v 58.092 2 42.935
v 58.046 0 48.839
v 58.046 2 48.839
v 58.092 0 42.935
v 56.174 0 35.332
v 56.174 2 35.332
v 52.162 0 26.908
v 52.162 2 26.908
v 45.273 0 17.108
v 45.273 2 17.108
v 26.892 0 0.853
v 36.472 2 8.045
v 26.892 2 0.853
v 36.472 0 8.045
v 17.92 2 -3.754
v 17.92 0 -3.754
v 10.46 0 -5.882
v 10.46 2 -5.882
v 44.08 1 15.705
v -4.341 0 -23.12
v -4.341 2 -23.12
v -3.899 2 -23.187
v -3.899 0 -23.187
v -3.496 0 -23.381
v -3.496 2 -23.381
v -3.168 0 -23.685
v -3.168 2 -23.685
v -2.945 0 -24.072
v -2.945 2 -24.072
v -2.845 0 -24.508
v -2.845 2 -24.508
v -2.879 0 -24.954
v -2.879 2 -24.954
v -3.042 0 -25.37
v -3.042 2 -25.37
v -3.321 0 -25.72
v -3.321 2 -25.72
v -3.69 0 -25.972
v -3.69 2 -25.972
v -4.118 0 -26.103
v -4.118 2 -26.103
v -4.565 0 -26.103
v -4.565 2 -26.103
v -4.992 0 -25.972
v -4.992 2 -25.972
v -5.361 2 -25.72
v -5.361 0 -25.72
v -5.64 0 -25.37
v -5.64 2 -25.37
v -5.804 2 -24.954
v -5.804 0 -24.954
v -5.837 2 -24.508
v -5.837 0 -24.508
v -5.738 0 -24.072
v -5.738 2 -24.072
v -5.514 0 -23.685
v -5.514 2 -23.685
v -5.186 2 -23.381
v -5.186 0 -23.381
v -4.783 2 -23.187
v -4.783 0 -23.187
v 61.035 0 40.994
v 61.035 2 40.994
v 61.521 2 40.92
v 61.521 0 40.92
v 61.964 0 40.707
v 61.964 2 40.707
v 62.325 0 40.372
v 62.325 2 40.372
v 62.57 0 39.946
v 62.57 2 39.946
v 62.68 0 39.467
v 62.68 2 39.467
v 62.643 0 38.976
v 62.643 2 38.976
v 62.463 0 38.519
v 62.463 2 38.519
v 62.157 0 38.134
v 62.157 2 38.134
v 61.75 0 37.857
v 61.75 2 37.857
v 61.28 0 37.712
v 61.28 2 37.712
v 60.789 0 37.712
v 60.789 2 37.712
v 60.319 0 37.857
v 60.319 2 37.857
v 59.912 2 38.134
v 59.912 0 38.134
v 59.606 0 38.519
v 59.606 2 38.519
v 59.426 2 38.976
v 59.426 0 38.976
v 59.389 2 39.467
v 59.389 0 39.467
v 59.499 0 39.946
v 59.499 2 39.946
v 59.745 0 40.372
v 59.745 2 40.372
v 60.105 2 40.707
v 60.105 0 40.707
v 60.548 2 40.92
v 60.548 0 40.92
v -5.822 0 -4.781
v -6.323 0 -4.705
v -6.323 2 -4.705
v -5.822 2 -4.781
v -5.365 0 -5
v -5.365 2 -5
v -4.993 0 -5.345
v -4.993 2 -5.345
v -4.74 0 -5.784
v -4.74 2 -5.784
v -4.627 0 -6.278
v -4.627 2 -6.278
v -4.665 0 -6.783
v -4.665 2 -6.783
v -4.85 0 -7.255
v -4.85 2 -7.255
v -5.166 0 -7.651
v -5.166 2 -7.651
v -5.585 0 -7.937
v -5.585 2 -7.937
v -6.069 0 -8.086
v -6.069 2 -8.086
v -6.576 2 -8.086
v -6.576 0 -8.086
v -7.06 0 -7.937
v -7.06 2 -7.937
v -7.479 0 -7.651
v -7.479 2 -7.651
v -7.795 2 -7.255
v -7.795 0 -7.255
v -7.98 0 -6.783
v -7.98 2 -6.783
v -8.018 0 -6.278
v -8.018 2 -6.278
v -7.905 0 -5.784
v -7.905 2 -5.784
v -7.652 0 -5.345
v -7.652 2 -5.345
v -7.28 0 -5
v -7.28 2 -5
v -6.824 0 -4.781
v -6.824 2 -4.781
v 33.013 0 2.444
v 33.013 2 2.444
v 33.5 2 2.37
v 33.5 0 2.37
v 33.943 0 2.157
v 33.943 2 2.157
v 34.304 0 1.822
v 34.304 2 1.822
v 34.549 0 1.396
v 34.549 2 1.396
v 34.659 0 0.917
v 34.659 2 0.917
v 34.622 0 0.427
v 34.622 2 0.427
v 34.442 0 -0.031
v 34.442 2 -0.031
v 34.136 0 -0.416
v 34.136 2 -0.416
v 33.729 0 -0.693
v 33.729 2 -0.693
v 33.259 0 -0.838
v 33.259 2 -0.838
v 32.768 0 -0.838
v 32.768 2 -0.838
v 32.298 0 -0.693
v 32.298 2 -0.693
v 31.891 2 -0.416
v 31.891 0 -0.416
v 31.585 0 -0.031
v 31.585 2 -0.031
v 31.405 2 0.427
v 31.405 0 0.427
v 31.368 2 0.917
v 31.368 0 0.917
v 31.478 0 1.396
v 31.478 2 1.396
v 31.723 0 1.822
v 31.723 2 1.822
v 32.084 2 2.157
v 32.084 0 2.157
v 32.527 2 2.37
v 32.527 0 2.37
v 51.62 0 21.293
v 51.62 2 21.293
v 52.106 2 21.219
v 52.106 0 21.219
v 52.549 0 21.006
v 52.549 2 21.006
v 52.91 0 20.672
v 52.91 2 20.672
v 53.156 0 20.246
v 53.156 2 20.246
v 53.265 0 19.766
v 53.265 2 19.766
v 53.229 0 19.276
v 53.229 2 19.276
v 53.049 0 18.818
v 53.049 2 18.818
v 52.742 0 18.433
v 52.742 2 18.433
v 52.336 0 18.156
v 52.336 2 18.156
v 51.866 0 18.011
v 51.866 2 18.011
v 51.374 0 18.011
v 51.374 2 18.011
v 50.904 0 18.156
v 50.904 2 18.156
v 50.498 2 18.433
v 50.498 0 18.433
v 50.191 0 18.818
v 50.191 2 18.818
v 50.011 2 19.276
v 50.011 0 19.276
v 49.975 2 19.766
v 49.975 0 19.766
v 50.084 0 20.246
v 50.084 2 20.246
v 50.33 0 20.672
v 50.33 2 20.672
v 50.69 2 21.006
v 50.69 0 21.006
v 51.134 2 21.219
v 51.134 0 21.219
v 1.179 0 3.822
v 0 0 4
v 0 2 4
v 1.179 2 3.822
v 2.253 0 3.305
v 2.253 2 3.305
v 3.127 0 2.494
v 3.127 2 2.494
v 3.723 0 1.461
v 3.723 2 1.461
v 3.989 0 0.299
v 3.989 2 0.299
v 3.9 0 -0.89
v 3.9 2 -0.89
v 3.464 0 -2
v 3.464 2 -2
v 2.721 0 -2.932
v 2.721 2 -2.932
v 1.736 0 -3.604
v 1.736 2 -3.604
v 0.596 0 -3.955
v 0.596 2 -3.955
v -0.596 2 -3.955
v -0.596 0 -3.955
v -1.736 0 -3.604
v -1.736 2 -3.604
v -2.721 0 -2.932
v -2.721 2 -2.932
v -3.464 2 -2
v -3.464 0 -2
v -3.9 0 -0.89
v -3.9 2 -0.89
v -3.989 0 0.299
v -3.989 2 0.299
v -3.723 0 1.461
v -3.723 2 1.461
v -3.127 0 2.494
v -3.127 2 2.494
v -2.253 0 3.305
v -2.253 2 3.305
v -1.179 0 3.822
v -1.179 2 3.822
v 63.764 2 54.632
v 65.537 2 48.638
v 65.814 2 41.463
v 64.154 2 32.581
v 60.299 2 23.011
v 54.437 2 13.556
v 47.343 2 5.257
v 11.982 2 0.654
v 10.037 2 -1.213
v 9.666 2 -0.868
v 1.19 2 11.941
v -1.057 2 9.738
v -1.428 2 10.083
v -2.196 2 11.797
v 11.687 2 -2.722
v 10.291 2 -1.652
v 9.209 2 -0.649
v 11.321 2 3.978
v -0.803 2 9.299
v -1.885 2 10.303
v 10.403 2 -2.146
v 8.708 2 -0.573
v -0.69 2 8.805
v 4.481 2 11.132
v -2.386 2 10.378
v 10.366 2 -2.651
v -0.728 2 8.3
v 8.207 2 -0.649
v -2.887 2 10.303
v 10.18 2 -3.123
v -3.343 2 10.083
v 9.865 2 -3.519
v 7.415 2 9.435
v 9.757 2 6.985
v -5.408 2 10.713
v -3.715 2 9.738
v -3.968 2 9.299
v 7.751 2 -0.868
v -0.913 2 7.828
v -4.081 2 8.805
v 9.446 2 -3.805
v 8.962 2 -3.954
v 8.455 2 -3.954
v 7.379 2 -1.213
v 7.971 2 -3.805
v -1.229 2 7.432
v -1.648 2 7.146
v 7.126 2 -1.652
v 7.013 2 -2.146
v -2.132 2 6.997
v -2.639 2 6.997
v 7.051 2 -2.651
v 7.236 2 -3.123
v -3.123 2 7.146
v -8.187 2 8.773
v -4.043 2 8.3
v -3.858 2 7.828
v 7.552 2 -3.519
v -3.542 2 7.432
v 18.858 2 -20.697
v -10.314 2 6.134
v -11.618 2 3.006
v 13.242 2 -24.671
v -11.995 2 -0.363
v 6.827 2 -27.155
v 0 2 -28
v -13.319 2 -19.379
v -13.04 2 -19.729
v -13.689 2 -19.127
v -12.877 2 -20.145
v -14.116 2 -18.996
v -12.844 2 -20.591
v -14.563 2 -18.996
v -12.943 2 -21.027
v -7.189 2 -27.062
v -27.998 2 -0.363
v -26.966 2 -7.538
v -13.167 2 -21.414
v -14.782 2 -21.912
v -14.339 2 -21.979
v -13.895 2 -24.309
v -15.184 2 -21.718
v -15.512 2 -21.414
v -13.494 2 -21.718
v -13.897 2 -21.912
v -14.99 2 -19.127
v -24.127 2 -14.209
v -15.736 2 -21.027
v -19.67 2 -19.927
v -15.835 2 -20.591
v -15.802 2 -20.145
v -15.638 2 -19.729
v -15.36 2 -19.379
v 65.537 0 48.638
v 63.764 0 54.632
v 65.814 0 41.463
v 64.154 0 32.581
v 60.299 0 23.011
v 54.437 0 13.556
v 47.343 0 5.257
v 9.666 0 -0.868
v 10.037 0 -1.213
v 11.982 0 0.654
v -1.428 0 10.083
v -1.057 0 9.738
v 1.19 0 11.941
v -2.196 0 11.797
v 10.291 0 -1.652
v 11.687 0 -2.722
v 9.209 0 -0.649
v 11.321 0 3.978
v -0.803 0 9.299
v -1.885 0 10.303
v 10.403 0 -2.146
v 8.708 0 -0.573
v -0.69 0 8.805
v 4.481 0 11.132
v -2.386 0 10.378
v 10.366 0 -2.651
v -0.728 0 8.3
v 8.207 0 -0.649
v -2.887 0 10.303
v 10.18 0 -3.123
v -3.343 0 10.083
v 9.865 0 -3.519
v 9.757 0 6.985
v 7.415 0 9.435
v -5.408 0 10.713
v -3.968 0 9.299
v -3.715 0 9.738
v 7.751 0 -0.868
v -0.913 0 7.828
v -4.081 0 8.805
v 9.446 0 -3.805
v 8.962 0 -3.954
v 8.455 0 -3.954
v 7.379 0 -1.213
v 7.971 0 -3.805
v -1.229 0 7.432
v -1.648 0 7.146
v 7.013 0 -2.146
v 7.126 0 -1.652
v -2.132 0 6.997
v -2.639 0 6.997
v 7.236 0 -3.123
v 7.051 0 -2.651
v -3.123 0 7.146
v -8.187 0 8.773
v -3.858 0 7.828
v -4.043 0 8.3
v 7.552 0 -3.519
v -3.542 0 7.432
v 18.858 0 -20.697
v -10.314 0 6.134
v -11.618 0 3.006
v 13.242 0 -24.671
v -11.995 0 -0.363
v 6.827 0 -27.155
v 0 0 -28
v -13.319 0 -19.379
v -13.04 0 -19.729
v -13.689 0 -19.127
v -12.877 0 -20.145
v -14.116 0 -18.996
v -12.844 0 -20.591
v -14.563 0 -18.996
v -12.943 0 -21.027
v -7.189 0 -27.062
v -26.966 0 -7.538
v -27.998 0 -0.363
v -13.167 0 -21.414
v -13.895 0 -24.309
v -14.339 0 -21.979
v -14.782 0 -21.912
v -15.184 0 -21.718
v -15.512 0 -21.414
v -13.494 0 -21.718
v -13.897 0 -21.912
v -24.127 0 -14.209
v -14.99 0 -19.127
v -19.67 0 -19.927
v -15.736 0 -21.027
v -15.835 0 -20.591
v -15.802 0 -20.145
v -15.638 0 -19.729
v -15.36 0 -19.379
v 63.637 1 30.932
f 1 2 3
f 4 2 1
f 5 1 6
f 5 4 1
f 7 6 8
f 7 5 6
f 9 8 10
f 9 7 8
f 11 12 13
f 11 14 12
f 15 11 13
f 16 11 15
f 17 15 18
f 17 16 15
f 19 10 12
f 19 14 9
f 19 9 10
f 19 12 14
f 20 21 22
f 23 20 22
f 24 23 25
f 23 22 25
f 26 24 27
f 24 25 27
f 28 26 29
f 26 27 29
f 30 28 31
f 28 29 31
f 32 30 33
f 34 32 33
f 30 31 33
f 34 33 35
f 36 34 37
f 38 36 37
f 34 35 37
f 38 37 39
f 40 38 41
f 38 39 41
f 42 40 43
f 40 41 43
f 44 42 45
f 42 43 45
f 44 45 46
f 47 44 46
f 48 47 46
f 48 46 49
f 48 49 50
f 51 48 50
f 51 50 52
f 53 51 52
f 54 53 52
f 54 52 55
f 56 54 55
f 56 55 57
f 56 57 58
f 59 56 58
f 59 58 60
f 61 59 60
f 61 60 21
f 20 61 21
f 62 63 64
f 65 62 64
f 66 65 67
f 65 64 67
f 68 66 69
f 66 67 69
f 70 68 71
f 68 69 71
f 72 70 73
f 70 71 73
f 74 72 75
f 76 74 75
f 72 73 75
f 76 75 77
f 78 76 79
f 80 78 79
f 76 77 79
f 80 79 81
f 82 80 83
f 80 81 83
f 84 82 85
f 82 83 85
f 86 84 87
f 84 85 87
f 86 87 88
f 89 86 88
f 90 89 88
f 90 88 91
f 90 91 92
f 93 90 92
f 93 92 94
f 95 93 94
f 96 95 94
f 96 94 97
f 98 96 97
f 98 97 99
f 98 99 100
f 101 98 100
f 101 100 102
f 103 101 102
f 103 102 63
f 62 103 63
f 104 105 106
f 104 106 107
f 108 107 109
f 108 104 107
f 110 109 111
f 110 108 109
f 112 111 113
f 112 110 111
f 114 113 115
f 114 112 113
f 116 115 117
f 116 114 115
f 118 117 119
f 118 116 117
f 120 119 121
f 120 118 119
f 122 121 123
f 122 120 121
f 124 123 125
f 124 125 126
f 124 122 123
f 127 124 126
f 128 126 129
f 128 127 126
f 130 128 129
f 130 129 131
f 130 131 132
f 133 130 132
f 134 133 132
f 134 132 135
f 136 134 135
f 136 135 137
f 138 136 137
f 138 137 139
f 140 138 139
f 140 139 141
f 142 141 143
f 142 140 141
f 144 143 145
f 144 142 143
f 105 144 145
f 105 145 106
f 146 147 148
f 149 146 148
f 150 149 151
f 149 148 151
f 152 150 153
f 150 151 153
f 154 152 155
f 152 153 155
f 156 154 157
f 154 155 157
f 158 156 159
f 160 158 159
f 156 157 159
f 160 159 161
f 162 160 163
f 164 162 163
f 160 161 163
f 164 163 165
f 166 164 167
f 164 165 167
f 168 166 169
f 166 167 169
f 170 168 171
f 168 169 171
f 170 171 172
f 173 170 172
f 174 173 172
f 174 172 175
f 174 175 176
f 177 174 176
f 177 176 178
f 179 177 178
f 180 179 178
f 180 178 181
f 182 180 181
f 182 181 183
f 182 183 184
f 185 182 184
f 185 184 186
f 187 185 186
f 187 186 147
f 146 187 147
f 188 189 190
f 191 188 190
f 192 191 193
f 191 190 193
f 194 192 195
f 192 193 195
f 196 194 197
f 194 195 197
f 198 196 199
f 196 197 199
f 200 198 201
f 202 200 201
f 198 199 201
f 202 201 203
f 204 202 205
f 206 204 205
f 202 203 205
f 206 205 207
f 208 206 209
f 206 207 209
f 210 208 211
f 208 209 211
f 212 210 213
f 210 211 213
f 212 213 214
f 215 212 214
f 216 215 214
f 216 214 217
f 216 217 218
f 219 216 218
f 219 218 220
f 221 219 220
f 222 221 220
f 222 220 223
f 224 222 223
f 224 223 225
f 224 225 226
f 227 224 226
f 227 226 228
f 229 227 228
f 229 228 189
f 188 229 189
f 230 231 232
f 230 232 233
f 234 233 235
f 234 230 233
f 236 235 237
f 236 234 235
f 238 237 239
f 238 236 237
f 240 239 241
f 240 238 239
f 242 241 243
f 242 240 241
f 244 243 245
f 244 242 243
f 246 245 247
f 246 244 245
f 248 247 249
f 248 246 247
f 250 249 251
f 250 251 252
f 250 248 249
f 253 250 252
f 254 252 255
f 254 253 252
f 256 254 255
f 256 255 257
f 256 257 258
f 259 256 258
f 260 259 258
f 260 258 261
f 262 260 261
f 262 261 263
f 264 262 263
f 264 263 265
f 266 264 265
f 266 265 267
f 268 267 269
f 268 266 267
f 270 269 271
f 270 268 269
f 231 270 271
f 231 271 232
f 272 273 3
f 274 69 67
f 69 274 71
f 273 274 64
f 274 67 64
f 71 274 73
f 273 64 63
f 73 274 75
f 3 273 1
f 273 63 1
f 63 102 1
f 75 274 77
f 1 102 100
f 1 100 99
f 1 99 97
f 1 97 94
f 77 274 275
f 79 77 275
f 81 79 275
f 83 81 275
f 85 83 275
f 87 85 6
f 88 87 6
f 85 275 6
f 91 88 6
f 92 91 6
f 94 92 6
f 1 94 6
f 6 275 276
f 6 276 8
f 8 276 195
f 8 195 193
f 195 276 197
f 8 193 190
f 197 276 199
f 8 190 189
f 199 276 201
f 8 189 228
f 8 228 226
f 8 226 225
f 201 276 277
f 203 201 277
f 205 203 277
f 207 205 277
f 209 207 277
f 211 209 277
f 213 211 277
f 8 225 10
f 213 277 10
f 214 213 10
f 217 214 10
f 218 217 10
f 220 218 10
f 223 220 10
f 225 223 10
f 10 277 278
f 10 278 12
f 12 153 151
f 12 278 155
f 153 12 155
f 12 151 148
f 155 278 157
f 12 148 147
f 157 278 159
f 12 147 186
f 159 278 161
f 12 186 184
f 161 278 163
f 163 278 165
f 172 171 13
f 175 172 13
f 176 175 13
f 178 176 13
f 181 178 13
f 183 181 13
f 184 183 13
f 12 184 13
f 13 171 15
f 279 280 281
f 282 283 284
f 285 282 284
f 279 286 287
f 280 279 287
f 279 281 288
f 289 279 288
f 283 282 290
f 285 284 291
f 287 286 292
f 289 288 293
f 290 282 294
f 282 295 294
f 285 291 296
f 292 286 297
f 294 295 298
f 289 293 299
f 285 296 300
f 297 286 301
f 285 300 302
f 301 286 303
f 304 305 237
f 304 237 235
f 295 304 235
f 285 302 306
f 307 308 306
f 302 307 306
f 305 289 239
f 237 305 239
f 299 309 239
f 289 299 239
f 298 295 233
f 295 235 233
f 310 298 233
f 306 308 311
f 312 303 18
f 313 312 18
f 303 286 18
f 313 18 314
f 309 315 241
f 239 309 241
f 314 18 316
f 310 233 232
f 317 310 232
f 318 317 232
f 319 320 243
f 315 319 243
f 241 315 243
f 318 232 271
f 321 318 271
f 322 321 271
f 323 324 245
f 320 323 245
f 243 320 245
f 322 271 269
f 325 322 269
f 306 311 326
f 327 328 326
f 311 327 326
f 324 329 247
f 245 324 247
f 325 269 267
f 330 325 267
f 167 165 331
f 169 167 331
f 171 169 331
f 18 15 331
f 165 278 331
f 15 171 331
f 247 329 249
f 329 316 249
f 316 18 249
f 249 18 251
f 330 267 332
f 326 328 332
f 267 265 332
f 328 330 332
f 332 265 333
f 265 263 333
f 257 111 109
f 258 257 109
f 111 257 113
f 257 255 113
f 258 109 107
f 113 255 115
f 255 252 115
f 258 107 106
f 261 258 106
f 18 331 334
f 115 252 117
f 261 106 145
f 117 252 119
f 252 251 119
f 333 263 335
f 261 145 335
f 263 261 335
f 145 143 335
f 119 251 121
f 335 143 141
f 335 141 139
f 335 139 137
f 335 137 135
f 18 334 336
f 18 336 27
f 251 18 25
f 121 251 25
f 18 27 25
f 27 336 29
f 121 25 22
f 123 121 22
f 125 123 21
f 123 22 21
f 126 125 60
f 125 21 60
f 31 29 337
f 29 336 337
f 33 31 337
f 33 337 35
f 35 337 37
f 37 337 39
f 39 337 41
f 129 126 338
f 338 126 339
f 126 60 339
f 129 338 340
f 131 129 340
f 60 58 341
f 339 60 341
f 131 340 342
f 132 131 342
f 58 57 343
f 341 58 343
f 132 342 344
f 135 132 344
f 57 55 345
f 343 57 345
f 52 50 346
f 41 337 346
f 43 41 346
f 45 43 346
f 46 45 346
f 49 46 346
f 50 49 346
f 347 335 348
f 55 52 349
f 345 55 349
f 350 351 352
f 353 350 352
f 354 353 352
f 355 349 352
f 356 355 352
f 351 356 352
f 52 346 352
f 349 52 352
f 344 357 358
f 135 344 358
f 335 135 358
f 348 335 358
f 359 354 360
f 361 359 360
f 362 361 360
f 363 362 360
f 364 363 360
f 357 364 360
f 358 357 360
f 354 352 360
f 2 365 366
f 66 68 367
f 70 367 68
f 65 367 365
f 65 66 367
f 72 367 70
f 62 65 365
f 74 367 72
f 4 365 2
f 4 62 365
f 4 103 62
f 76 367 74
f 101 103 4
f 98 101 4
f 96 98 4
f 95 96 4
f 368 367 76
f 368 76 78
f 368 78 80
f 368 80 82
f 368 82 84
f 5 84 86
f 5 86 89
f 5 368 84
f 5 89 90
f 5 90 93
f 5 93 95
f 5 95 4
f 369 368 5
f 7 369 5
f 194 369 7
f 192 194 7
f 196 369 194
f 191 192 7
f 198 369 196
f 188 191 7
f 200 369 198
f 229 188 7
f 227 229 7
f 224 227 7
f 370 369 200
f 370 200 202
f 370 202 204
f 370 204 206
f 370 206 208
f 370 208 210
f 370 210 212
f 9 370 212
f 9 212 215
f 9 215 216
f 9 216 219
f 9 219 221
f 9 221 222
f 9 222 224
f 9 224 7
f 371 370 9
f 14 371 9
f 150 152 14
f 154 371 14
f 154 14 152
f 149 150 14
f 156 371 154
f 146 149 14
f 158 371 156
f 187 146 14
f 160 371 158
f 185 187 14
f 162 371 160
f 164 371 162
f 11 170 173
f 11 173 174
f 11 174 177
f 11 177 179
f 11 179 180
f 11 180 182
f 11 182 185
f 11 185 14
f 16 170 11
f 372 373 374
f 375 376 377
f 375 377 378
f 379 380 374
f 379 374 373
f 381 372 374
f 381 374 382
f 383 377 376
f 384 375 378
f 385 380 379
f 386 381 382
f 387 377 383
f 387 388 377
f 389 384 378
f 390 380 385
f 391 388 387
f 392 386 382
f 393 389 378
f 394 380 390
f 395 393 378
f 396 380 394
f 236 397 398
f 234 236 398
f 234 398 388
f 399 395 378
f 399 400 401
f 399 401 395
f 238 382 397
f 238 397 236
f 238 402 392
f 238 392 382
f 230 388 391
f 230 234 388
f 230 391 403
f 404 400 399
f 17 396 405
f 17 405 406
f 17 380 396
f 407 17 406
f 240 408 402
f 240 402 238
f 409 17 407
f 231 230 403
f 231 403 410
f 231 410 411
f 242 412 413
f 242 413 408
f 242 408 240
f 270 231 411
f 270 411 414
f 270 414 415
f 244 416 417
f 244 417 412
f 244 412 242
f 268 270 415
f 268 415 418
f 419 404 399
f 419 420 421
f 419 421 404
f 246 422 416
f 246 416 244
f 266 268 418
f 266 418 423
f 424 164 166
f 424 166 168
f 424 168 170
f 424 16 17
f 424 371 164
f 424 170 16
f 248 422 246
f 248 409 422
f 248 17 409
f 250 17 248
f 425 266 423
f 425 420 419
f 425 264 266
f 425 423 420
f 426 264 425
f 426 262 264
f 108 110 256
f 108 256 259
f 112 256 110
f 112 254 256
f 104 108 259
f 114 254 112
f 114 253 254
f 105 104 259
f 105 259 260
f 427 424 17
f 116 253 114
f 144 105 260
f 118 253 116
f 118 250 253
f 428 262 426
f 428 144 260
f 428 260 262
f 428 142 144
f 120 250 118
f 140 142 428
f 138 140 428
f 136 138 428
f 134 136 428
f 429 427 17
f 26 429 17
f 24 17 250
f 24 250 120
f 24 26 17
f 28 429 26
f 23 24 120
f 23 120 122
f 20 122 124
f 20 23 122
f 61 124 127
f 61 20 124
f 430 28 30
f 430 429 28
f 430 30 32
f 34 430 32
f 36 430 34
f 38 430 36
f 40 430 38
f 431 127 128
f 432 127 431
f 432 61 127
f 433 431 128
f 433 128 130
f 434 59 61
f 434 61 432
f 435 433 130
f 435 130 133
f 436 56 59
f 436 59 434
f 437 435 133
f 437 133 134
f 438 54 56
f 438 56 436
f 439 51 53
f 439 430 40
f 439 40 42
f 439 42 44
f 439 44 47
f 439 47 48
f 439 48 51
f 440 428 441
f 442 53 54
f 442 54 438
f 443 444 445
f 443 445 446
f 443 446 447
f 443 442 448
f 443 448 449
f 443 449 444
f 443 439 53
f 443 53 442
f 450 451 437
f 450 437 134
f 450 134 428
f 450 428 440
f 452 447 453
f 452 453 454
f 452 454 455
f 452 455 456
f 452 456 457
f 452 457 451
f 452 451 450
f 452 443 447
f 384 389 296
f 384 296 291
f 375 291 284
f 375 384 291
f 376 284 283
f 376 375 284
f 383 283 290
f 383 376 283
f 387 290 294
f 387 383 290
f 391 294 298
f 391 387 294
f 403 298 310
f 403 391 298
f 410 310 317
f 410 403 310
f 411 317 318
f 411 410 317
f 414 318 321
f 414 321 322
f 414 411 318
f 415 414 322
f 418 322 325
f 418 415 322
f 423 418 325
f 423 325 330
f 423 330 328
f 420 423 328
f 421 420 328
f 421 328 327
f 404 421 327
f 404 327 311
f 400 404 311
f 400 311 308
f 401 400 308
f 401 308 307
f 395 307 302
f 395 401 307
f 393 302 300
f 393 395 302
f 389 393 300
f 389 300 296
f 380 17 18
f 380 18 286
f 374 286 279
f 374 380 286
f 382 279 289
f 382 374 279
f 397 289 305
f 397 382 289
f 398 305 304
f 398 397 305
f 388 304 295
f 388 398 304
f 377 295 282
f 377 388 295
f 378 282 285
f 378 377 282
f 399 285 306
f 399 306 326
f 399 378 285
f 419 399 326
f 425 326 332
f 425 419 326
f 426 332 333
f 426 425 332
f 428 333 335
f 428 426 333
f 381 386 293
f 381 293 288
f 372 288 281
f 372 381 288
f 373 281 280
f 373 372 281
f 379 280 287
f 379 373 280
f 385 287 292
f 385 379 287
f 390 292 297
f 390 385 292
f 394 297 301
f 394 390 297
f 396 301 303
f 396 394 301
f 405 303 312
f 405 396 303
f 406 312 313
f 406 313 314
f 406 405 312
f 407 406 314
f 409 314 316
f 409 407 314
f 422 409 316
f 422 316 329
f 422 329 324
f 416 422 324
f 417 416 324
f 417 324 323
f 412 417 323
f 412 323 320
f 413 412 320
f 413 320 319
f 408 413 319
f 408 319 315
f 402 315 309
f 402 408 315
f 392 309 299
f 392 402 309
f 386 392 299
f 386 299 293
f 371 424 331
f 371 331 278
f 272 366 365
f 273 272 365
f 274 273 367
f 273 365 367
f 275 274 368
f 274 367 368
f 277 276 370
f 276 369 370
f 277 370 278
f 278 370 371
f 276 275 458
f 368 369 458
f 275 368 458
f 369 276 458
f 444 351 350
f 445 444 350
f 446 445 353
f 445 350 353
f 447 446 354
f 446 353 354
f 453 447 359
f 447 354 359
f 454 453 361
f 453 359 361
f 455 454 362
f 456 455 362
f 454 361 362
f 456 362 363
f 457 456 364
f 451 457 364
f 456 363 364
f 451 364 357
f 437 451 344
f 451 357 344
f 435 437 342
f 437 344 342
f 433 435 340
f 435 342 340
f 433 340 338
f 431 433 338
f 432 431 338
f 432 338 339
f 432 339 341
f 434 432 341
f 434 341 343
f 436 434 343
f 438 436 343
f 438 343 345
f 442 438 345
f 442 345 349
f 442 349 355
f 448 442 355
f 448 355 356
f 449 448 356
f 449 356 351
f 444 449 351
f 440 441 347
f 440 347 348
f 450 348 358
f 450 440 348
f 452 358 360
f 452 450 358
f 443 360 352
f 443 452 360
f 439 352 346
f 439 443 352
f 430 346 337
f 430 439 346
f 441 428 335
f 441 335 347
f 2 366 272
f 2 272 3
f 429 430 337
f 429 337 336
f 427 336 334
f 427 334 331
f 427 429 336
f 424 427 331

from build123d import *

# Parameters (mm, degrees)
SKETCH_1_R          = 1.7
SKETCH_1_R_2        = 4
EXTRUDE_1_DEPTH     = 2
SKETCH_2_R          = 1.5
SKETCH_2_R_2        = 1.65
CUT_EXTRUDE_2_DEPTH = 86.626937008


with BuildPart() as part:
    # Эскиз1 → Бобышка-Вытянуть1 (new body)
    with BuildSketch(Plane(origin=(0, 0, 0), x_dir=(1, 0, 0), z_dir=(0, 1, 0))):
        with BuildLine():
            Line((-11.994516295, 0.362737998), (-27.997650279, 0.362737998))
            ThreePointArc((-27.997650279, 0.362737998), (-19.670324553, 19.926824433), (0, 28))
            ThreePointArc((0, 28), (10.111304648, 26.110563347), (18.857990039, 20.697251308))
            Line((18.857990039, 20.697251308), (47.343097909, -5.256527408))
            add(Edge.make_bspline(
                [(63.764396425, -54.631632015), (73.929390971, -32.189504173), (47.343097909, -5.256527408)],
                knots=[3.37709689, 3.37709689, 3.37709689, 4.71238898, 4.71238898, 4.71238898], degree=2, weights=[1, 0.785281266, 1]))
            Line((63.764396425, -54.631632015), (58.046409316, -48.83908269))
            add(Edge.make_bspline(
                [(58.046409316, -48.83908269), (65.599461261, -3.0612118), (10.459692489, 5.881737247)],
                knots=[0.348473456, 0.348473456, 0.348473456, 2.541551794, 2.541551794, 2.541551794], degree=2, weights=[1, 0.456677717, 1]))
            ThreePointArc((10.459692489, 5.881737247), (2.864220523, -11.653164411), (-11.994516295, 0.362737998))
        make_face()
        with Locations(Location((-6.322604321, 6.40505071, 0), (0, 0, 270))):
            Circle(SKETCH_1_R, mode=Mode.SUBTRACT)
        with Locations(Location((0, 0, 0), (0, 0, 270))):
            Circle(SKETCH_1_R_2, mode=Mode.SUBTRACT)
        with Locations(Location((8.708238788, 2.273010605, 0), (0, 0, 270))):
            Circle(SKETCH_1_R, mode=Mode.SUBTRACT)
        with Locations(Location((-2.385634467, -8.678061315, 0), (0, 0, 270))):
            Circle(SKETCH_1_R, mode=Mode.SUBTRACT)
    extrude(amount=EXTRUDE_1_DEPTH)

    # Эскиз2 → Вырез-Вытянуть2 (cut, through all)
    with BuildSketch(Plane(origin=(0, 2, 0), x_dir=(1, 0, 0), z_dir=(0, 1, 0))):
        with Locations(Location((-4.341204442, 24.620193825, 0), (0, 0, 270))):
            Circle(SKETCH_2_R)
        with Locations(Location((-14.339410909, 20.478801107, 0), (0, 0, 90))):
            Circle(SKETCH_2_R)
        with Locations(Location((51.61994824, -19.642751406, 0), (0, 0, 270))):
            Circle(SKETCH_2_R_2)
        with Locations(Location((61.034534355, -39.343644659, 0), (0, 0, 270))):
            Circle(SKETCH_2_R_2)
        with Locations(Location((33.013487472, -0.79366348, 0), (0, 0, 270))):
            Circle(SKETCH_2_R_2)
    extrude(amount=-CUT_EXTRUDE_2_DEPTH, mode=Mode.SUBTRACT)


solid = part.part
